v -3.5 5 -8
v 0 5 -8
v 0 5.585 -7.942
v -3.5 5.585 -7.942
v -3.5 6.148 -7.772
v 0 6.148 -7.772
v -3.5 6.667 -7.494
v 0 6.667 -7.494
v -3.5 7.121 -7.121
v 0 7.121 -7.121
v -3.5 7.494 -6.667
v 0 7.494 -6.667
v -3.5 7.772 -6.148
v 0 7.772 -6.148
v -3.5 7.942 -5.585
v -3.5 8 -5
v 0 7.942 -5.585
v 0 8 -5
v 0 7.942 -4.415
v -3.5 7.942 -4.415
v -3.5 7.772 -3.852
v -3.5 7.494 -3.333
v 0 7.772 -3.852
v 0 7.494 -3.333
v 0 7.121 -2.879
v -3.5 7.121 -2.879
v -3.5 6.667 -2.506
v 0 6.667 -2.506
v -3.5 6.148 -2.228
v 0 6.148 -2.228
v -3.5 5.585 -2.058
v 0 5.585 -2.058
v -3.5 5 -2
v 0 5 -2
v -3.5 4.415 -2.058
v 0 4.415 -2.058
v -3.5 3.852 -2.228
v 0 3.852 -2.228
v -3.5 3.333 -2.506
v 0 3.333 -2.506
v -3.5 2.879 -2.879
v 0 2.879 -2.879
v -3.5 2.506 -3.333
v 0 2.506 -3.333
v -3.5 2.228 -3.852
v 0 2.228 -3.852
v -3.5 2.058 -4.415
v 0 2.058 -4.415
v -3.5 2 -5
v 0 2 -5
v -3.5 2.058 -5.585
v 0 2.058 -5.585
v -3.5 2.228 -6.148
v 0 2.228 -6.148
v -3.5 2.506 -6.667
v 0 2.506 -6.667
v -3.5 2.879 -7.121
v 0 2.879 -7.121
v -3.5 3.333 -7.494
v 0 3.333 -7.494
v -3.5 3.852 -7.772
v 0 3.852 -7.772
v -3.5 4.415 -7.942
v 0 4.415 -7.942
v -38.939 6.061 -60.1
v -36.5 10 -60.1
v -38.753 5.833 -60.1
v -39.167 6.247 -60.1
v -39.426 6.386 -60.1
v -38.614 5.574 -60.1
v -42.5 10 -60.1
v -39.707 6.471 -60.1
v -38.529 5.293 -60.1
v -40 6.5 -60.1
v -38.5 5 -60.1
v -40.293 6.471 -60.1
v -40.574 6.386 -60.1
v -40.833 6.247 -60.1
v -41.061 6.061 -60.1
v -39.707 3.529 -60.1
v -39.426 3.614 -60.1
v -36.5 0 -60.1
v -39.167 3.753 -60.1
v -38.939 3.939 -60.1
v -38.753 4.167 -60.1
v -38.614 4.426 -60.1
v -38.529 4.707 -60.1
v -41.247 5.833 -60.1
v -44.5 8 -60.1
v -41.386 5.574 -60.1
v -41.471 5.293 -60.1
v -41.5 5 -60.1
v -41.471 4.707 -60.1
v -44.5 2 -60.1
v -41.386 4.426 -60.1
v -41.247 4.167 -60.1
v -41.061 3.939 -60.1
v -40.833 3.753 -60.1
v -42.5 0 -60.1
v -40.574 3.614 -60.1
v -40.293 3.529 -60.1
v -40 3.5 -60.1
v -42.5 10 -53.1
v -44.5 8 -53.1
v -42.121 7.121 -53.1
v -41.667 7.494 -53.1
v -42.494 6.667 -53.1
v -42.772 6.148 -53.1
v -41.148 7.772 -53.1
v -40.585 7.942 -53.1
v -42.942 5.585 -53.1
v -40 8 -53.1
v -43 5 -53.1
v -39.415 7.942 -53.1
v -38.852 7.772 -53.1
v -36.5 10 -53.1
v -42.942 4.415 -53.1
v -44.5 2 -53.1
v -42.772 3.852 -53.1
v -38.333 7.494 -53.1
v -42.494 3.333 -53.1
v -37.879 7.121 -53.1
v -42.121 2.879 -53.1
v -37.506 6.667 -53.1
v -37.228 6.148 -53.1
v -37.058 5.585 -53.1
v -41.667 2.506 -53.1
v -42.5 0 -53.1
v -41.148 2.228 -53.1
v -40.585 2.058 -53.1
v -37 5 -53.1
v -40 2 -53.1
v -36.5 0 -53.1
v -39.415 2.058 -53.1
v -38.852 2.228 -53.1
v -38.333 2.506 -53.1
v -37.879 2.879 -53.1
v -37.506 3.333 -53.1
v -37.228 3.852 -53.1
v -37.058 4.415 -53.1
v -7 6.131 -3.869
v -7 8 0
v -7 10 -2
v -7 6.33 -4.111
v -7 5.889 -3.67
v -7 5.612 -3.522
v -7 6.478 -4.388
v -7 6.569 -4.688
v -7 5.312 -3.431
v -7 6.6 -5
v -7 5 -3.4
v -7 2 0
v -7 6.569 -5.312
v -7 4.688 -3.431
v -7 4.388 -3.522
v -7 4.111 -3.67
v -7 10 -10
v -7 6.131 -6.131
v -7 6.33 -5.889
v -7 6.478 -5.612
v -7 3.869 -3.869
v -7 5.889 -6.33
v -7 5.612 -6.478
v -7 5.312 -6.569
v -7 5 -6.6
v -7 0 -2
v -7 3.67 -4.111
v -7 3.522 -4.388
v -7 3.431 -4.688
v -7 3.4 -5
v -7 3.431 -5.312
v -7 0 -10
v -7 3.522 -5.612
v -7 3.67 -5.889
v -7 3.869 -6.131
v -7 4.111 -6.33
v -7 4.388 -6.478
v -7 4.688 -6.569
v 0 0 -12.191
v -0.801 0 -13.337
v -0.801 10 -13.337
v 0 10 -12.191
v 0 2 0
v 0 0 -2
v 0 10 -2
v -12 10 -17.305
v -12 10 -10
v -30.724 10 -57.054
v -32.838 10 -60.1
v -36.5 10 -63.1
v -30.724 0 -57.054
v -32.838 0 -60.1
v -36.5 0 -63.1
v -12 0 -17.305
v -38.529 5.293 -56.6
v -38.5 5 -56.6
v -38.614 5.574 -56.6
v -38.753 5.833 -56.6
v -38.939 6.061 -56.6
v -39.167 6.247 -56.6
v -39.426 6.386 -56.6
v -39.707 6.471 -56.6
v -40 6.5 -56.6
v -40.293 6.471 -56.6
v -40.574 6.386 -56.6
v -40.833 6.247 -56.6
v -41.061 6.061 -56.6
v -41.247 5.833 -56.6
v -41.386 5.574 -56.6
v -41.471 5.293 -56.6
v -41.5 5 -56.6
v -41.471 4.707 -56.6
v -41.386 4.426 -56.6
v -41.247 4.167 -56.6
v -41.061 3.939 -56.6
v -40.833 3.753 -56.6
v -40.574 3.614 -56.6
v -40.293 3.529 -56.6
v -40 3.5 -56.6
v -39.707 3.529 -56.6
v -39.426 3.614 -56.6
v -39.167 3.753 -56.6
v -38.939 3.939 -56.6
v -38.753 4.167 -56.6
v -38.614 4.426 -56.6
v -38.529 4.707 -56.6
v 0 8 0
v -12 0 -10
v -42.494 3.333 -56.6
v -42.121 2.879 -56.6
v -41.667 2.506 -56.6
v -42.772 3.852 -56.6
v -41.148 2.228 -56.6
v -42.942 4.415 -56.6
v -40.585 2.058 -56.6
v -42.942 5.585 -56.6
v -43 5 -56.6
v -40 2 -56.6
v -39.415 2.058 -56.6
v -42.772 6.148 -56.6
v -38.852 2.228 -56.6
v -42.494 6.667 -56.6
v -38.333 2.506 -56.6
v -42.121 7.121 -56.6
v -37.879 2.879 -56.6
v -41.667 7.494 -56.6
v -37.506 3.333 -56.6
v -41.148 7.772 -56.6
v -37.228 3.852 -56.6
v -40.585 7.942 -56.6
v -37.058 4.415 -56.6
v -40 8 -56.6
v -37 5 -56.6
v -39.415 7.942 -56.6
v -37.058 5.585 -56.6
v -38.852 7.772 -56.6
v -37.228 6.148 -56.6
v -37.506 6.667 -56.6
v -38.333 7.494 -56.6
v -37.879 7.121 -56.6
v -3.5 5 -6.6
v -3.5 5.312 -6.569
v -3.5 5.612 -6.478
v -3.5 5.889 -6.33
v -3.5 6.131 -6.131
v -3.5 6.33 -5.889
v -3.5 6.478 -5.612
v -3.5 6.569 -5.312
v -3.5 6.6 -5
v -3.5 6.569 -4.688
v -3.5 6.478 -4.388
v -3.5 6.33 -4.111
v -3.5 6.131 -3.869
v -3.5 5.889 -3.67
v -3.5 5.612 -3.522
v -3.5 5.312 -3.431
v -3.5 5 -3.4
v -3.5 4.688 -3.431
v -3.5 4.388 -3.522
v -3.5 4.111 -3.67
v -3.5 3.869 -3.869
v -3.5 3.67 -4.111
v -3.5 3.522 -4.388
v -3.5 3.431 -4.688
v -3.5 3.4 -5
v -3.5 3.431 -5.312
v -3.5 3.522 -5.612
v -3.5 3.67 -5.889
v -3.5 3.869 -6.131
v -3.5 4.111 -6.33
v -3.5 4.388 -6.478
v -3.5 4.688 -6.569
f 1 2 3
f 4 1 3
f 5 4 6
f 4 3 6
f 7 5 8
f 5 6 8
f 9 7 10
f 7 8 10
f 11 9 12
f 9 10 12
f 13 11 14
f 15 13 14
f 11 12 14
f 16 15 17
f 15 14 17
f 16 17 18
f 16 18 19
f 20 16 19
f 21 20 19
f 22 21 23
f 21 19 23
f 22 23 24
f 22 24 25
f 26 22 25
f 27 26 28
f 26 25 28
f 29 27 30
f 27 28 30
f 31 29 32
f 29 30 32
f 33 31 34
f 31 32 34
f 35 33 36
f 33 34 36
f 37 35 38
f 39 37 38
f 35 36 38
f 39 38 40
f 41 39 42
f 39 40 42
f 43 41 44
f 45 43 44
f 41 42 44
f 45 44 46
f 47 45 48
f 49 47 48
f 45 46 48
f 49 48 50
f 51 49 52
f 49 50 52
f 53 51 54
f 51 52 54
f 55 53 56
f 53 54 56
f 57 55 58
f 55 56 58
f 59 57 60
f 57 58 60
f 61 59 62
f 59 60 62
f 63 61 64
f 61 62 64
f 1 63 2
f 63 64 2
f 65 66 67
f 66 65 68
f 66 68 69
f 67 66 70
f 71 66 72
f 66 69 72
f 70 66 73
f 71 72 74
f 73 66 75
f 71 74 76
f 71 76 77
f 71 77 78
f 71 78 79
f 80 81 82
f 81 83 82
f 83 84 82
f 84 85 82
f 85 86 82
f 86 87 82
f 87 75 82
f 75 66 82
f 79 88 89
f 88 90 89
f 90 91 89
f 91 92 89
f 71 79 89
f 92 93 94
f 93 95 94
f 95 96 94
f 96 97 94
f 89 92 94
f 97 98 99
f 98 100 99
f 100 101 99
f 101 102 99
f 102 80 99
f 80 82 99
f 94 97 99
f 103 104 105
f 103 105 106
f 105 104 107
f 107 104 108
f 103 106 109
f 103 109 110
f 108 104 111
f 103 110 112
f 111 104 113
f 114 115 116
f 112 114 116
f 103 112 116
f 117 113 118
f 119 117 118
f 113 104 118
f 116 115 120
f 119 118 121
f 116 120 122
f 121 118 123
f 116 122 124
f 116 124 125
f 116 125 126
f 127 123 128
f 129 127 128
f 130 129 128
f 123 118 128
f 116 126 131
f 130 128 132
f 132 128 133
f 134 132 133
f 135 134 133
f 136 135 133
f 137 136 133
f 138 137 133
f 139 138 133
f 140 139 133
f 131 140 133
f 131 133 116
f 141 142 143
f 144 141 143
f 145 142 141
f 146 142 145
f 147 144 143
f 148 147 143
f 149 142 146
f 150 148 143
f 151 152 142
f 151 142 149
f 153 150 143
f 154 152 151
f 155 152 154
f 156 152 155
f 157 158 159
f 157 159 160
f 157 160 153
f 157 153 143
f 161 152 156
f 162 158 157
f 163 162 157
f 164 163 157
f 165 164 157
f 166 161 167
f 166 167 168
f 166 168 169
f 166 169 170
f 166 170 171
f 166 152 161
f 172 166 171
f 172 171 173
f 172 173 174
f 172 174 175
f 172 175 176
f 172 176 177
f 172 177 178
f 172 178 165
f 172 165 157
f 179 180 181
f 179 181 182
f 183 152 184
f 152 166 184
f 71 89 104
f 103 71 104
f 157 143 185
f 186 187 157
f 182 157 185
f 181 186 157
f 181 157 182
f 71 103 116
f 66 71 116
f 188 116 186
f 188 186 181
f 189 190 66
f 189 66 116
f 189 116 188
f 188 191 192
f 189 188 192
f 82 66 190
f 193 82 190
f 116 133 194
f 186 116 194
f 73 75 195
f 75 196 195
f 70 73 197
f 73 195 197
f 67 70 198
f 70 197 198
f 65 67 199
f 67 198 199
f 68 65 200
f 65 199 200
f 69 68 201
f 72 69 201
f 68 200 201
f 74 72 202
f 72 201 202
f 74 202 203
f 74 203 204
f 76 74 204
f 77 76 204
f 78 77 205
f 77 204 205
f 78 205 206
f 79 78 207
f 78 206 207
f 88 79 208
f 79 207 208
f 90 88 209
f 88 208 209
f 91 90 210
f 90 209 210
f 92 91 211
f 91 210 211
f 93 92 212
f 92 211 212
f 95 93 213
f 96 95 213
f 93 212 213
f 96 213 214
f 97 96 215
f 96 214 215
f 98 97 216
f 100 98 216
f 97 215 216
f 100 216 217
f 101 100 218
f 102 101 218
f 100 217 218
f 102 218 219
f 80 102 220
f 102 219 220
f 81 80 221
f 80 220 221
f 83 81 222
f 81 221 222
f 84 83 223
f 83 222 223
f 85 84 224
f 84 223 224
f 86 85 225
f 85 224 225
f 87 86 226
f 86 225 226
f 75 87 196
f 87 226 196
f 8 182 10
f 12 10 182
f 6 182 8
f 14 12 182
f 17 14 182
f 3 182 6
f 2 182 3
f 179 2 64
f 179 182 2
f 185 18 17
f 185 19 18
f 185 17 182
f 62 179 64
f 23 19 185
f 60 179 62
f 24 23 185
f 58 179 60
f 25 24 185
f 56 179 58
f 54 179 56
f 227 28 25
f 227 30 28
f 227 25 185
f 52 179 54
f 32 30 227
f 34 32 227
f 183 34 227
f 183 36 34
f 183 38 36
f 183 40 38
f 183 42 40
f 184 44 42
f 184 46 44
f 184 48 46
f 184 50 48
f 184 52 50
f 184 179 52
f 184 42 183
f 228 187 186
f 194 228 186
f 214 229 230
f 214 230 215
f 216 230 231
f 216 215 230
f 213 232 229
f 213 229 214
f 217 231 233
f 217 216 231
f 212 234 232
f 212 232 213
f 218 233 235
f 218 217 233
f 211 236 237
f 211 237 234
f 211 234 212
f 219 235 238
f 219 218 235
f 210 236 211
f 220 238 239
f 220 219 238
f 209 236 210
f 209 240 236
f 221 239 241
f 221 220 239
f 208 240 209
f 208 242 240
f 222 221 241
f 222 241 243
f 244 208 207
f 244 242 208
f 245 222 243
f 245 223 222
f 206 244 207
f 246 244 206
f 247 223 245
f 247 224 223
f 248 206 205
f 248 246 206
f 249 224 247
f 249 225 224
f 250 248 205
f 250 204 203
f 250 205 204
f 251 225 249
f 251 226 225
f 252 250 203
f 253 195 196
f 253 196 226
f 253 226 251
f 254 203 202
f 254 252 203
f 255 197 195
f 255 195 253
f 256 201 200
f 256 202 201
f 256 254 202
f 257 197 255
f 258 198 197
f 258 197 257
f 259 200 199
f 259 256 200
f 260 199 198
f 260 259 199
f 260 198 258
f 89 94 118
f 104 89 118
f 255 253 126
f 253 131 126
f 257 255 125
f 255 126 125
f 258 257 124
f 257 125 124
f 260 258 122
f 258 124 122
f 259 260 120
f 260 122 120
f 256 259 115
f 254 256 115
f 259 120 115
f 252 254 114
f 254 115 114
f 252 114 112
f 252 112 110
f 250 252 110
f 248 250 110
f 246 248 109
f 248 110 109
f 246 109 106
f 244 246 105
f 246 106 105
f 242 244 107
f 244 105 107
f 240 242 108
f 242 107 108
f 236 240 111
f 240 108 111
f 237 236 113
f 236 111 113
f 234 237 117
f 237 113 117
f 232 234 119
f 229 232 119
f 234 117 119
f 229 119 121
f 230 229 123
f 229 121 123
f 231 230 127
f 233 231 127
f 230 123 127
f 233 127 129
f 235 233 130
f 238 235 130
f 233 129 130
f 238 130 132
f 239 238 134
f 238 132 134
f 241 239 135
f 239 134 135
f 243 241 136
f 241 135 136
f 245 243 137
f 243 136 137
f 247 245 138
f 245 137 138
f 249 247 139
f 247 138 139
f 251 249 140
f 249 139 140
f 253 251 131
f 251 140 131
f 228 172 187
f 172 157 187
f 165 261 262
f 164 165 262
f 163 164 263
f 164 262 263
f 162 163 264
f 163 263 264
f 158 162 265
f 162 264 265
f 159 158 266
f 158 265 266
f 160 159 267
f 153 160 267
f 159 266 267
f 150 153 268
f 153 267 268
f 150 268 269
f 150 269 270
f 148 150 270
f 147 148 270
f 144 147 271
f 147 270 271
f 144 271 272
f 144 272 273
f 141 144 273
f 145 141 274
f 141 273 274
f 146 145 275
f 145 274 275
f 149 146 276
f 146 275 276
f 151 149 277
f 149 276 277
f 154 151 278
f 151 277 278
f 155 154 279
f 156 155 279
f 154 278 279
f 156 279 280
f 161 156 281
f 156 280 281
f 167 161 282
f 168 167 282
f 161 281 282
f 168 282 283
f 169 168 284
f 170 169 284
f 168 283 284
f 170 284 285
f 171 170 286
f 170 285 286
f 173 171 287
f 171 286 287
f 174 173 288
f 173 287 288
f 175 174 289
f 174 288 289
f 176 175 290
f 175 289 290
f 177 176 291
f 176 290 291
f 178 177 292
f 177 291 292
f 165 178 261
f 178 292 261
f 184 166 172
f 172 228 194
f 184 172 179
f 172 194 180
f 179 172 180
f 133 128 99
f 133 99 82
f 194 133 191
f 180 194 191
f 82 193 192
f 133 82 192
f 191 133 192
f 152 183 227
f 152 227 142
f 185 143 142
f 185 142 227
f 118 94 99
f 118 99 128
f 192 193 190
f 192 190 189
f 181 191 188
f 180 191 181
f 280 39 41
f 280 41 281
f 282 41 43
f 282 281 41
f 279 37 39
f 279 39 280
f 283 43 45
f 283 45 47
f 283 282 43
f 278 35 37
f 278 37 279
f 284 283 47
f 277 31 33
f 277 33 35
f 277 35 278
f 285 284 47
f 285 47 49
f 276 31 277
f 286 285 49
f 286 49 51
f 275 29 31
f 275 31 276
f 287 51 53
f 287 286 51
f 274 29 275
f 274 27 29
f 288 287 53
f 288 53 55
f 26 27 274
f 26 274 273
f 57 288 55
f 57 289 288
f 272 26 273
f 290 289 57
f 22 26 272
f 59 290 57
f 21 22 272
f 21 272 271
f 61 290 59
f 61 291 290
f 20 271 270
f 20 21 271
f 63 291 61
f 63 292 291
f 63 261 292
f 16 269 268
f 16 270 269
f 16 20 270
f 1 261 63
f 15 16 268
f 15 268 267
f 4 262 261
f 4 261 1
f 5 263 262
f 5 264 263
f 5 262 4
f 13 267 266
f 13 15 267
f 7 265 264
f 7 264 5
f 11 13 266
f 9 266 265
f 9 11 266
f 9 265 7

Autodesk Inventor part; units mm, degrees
ref_plane "YZ Plane" through (0, 0, 0) normal (1, 0, 0) x (0, 1, 0)
ref_plane "XZ Plane" through (0, 0, 0) normal (0, 1, 0) x (-1, 0, 0)
ref_plane "XY Plane" through (0, 0, 0) normal (0, 0, 1) x (1, 0, 0)
sketch "Sketch1" plane through (0, 0, 0) normal (0, 1, 0) x (-1, 0, 0)
  line L0 (0, 0) -> (7, 0)
  line L1 (7, 0) -> (7, -10)
  line L2 (7, -10) -> (0, -10)
  line L3 (0, -10) -> (0, 0)
  line L4 (36.5, -60.1) -> (44.5, -60.1)
  line L5 (44.5, -60.1) -> (44.5, -53.1)
  line L6 (44.5, -53.1) -> (36.5, -53.1)
  line L7 (36.5, -53.1) -> (36.5, -60.1)
  line L8 (36.5, -53.1) -> (7, -10)
  line L9 (30.7235, -57.0537) -> (0.8012, -13.3368)
  line L10 (0.8012, -13.3368) -> (0, -12.1913)
  line L11 (0, -12.1913) -> (0, -10)
  line L12 (30.7235, -57.0537) -> (32.8378, -60.1)
  line L13 (32.8378, -60.1) -> (36.5, -60.1)
  dimension "d0" = 10
  dimension "d1" = 7
  dimension "d7" = 29.5
  dimension "d14" = 50.1
  dimension "d15" = 7
  dimension "d16" = 8
  dimension "d17" = 7
extrude "Extrusion1" add sketch "Sketch1" along normal blind 10
chamfer "Chamfer1" distance 2 angle 45 4 edges at (-44.5, 0, -56.6) (-44.5, 10, -56.6) (-3.5, 10, 0) (-3.5, 0, 0)
sketch "Sketch2" plane through (0, 0, -12.1913) normal (1, 0, 0) x (0, 0, -1)
  line L0 (-12.1913, 0) -> (-2.1913, 0) construction
  line L1 (-2.1913, 0) -> (-2.1913, 10) construction
  line L2 (-2.1913, 10) -> (-12.1913, 10) construction
  line L3 (-12.1913, 10) -> (-12.1913, 0) construction
  line L4 (-2.1913, 10) -> (-12.1913, 0) construction
  circle A0 centre (-7.1913, 5) radius 1.6
  dimension "d21" = 10
  dimension "d22" = 10
  dimension "d23" = 3.2
extrude "Extrusion2" cut sketch "Sketch2" against normal through all
sketch "Sketch3" plane through (-36.5, 0, -53.1) normal (0, 0, 1) x (1, 0, 0)
  line L0 (0, 0) -> (0, 10) projected
  line L1 (0, 10) -> (-10, 0) construction
  line L2 (0, 10) -> (14.1421, 10) construction
  line L3 (0, 5) -> (-3.5, 5)
  circle A0 centre (-3.5, 5) radius 1.5
  point P0 (36.5, 0)
  dimension "d26" = 135
  dimension "d27" = 3.5
  dimension "d28" = 3
extrude "Extrusion3" cut sketch "Sketch3" against normal blind 10
sketch "Sketch4" plane through (0, 0, -12.1913) normal (1, 0, 0) x (0, 0, -1)
  circle A0 centre (-7.1913, 5) radius 1.6 projected
  circle A1 centre (-7.1913, 5) radius 3
  point P0 (-12.1913, 0)
  dimension "d31" = 6
extrude "Extrusion4" cut sketch "Sketch4" against normal blind 3.5
sketch "Sketch5" plane through (-36.5, 0, -53.1) normal (0, 0, 1) x (1, 0, 0)
  circle A0 centre (-3.5, 5) radius 3
  point P0 (36.5, 0)
  dimension "d34" = 6
extrude "Extrusion5" cut sketch "Sketch5" against normal blind 3.5
sketch "Sketch6" plane through (0, 10, 0) normal (0, 1, 0) x (1, 0, 0)
  line L0 (-7, 10) -> (-7, 2) projected
  line L1 (-7, 10) -> (-12, 10)
  line L2 (-12, 10) -> (-12, 17.3051)
  line L3 (-36.5, 53.1) -> (-7, 10) projected
  point P0 (0, 0)
  dimension "d37" = 5
  dimension "d38" = 90
extrude "Extrusion6" add sketch "Sketch6" against normal blind 10
sketch "Sketch7" plane through (0, 10, 0) normal (0, 1, 0) x (1, 0, 0)
  line L0 (-30.7235, 57.0537) -> (-32.8378, 60.1) projected
  line L1 (-32.8378, 60.1) -> (-36.4998, 60.1)
  line L2 (-32.8378, 60.1) -> (-42.5, 60.1) projected
  line L3 (-36.4998, 60.1) -> (-36.4998, 63.1)
  line L4 (-36.4998, 63.1) -> (-32.8378, 60.1)
  point P0 (0, 0)
  dimension "d41" = 3.662
  dimension "d42" = 3
extrude "Extrusion7" add sketch "Sketch7" against normal blind 10
properties part number "HoldingArms"
